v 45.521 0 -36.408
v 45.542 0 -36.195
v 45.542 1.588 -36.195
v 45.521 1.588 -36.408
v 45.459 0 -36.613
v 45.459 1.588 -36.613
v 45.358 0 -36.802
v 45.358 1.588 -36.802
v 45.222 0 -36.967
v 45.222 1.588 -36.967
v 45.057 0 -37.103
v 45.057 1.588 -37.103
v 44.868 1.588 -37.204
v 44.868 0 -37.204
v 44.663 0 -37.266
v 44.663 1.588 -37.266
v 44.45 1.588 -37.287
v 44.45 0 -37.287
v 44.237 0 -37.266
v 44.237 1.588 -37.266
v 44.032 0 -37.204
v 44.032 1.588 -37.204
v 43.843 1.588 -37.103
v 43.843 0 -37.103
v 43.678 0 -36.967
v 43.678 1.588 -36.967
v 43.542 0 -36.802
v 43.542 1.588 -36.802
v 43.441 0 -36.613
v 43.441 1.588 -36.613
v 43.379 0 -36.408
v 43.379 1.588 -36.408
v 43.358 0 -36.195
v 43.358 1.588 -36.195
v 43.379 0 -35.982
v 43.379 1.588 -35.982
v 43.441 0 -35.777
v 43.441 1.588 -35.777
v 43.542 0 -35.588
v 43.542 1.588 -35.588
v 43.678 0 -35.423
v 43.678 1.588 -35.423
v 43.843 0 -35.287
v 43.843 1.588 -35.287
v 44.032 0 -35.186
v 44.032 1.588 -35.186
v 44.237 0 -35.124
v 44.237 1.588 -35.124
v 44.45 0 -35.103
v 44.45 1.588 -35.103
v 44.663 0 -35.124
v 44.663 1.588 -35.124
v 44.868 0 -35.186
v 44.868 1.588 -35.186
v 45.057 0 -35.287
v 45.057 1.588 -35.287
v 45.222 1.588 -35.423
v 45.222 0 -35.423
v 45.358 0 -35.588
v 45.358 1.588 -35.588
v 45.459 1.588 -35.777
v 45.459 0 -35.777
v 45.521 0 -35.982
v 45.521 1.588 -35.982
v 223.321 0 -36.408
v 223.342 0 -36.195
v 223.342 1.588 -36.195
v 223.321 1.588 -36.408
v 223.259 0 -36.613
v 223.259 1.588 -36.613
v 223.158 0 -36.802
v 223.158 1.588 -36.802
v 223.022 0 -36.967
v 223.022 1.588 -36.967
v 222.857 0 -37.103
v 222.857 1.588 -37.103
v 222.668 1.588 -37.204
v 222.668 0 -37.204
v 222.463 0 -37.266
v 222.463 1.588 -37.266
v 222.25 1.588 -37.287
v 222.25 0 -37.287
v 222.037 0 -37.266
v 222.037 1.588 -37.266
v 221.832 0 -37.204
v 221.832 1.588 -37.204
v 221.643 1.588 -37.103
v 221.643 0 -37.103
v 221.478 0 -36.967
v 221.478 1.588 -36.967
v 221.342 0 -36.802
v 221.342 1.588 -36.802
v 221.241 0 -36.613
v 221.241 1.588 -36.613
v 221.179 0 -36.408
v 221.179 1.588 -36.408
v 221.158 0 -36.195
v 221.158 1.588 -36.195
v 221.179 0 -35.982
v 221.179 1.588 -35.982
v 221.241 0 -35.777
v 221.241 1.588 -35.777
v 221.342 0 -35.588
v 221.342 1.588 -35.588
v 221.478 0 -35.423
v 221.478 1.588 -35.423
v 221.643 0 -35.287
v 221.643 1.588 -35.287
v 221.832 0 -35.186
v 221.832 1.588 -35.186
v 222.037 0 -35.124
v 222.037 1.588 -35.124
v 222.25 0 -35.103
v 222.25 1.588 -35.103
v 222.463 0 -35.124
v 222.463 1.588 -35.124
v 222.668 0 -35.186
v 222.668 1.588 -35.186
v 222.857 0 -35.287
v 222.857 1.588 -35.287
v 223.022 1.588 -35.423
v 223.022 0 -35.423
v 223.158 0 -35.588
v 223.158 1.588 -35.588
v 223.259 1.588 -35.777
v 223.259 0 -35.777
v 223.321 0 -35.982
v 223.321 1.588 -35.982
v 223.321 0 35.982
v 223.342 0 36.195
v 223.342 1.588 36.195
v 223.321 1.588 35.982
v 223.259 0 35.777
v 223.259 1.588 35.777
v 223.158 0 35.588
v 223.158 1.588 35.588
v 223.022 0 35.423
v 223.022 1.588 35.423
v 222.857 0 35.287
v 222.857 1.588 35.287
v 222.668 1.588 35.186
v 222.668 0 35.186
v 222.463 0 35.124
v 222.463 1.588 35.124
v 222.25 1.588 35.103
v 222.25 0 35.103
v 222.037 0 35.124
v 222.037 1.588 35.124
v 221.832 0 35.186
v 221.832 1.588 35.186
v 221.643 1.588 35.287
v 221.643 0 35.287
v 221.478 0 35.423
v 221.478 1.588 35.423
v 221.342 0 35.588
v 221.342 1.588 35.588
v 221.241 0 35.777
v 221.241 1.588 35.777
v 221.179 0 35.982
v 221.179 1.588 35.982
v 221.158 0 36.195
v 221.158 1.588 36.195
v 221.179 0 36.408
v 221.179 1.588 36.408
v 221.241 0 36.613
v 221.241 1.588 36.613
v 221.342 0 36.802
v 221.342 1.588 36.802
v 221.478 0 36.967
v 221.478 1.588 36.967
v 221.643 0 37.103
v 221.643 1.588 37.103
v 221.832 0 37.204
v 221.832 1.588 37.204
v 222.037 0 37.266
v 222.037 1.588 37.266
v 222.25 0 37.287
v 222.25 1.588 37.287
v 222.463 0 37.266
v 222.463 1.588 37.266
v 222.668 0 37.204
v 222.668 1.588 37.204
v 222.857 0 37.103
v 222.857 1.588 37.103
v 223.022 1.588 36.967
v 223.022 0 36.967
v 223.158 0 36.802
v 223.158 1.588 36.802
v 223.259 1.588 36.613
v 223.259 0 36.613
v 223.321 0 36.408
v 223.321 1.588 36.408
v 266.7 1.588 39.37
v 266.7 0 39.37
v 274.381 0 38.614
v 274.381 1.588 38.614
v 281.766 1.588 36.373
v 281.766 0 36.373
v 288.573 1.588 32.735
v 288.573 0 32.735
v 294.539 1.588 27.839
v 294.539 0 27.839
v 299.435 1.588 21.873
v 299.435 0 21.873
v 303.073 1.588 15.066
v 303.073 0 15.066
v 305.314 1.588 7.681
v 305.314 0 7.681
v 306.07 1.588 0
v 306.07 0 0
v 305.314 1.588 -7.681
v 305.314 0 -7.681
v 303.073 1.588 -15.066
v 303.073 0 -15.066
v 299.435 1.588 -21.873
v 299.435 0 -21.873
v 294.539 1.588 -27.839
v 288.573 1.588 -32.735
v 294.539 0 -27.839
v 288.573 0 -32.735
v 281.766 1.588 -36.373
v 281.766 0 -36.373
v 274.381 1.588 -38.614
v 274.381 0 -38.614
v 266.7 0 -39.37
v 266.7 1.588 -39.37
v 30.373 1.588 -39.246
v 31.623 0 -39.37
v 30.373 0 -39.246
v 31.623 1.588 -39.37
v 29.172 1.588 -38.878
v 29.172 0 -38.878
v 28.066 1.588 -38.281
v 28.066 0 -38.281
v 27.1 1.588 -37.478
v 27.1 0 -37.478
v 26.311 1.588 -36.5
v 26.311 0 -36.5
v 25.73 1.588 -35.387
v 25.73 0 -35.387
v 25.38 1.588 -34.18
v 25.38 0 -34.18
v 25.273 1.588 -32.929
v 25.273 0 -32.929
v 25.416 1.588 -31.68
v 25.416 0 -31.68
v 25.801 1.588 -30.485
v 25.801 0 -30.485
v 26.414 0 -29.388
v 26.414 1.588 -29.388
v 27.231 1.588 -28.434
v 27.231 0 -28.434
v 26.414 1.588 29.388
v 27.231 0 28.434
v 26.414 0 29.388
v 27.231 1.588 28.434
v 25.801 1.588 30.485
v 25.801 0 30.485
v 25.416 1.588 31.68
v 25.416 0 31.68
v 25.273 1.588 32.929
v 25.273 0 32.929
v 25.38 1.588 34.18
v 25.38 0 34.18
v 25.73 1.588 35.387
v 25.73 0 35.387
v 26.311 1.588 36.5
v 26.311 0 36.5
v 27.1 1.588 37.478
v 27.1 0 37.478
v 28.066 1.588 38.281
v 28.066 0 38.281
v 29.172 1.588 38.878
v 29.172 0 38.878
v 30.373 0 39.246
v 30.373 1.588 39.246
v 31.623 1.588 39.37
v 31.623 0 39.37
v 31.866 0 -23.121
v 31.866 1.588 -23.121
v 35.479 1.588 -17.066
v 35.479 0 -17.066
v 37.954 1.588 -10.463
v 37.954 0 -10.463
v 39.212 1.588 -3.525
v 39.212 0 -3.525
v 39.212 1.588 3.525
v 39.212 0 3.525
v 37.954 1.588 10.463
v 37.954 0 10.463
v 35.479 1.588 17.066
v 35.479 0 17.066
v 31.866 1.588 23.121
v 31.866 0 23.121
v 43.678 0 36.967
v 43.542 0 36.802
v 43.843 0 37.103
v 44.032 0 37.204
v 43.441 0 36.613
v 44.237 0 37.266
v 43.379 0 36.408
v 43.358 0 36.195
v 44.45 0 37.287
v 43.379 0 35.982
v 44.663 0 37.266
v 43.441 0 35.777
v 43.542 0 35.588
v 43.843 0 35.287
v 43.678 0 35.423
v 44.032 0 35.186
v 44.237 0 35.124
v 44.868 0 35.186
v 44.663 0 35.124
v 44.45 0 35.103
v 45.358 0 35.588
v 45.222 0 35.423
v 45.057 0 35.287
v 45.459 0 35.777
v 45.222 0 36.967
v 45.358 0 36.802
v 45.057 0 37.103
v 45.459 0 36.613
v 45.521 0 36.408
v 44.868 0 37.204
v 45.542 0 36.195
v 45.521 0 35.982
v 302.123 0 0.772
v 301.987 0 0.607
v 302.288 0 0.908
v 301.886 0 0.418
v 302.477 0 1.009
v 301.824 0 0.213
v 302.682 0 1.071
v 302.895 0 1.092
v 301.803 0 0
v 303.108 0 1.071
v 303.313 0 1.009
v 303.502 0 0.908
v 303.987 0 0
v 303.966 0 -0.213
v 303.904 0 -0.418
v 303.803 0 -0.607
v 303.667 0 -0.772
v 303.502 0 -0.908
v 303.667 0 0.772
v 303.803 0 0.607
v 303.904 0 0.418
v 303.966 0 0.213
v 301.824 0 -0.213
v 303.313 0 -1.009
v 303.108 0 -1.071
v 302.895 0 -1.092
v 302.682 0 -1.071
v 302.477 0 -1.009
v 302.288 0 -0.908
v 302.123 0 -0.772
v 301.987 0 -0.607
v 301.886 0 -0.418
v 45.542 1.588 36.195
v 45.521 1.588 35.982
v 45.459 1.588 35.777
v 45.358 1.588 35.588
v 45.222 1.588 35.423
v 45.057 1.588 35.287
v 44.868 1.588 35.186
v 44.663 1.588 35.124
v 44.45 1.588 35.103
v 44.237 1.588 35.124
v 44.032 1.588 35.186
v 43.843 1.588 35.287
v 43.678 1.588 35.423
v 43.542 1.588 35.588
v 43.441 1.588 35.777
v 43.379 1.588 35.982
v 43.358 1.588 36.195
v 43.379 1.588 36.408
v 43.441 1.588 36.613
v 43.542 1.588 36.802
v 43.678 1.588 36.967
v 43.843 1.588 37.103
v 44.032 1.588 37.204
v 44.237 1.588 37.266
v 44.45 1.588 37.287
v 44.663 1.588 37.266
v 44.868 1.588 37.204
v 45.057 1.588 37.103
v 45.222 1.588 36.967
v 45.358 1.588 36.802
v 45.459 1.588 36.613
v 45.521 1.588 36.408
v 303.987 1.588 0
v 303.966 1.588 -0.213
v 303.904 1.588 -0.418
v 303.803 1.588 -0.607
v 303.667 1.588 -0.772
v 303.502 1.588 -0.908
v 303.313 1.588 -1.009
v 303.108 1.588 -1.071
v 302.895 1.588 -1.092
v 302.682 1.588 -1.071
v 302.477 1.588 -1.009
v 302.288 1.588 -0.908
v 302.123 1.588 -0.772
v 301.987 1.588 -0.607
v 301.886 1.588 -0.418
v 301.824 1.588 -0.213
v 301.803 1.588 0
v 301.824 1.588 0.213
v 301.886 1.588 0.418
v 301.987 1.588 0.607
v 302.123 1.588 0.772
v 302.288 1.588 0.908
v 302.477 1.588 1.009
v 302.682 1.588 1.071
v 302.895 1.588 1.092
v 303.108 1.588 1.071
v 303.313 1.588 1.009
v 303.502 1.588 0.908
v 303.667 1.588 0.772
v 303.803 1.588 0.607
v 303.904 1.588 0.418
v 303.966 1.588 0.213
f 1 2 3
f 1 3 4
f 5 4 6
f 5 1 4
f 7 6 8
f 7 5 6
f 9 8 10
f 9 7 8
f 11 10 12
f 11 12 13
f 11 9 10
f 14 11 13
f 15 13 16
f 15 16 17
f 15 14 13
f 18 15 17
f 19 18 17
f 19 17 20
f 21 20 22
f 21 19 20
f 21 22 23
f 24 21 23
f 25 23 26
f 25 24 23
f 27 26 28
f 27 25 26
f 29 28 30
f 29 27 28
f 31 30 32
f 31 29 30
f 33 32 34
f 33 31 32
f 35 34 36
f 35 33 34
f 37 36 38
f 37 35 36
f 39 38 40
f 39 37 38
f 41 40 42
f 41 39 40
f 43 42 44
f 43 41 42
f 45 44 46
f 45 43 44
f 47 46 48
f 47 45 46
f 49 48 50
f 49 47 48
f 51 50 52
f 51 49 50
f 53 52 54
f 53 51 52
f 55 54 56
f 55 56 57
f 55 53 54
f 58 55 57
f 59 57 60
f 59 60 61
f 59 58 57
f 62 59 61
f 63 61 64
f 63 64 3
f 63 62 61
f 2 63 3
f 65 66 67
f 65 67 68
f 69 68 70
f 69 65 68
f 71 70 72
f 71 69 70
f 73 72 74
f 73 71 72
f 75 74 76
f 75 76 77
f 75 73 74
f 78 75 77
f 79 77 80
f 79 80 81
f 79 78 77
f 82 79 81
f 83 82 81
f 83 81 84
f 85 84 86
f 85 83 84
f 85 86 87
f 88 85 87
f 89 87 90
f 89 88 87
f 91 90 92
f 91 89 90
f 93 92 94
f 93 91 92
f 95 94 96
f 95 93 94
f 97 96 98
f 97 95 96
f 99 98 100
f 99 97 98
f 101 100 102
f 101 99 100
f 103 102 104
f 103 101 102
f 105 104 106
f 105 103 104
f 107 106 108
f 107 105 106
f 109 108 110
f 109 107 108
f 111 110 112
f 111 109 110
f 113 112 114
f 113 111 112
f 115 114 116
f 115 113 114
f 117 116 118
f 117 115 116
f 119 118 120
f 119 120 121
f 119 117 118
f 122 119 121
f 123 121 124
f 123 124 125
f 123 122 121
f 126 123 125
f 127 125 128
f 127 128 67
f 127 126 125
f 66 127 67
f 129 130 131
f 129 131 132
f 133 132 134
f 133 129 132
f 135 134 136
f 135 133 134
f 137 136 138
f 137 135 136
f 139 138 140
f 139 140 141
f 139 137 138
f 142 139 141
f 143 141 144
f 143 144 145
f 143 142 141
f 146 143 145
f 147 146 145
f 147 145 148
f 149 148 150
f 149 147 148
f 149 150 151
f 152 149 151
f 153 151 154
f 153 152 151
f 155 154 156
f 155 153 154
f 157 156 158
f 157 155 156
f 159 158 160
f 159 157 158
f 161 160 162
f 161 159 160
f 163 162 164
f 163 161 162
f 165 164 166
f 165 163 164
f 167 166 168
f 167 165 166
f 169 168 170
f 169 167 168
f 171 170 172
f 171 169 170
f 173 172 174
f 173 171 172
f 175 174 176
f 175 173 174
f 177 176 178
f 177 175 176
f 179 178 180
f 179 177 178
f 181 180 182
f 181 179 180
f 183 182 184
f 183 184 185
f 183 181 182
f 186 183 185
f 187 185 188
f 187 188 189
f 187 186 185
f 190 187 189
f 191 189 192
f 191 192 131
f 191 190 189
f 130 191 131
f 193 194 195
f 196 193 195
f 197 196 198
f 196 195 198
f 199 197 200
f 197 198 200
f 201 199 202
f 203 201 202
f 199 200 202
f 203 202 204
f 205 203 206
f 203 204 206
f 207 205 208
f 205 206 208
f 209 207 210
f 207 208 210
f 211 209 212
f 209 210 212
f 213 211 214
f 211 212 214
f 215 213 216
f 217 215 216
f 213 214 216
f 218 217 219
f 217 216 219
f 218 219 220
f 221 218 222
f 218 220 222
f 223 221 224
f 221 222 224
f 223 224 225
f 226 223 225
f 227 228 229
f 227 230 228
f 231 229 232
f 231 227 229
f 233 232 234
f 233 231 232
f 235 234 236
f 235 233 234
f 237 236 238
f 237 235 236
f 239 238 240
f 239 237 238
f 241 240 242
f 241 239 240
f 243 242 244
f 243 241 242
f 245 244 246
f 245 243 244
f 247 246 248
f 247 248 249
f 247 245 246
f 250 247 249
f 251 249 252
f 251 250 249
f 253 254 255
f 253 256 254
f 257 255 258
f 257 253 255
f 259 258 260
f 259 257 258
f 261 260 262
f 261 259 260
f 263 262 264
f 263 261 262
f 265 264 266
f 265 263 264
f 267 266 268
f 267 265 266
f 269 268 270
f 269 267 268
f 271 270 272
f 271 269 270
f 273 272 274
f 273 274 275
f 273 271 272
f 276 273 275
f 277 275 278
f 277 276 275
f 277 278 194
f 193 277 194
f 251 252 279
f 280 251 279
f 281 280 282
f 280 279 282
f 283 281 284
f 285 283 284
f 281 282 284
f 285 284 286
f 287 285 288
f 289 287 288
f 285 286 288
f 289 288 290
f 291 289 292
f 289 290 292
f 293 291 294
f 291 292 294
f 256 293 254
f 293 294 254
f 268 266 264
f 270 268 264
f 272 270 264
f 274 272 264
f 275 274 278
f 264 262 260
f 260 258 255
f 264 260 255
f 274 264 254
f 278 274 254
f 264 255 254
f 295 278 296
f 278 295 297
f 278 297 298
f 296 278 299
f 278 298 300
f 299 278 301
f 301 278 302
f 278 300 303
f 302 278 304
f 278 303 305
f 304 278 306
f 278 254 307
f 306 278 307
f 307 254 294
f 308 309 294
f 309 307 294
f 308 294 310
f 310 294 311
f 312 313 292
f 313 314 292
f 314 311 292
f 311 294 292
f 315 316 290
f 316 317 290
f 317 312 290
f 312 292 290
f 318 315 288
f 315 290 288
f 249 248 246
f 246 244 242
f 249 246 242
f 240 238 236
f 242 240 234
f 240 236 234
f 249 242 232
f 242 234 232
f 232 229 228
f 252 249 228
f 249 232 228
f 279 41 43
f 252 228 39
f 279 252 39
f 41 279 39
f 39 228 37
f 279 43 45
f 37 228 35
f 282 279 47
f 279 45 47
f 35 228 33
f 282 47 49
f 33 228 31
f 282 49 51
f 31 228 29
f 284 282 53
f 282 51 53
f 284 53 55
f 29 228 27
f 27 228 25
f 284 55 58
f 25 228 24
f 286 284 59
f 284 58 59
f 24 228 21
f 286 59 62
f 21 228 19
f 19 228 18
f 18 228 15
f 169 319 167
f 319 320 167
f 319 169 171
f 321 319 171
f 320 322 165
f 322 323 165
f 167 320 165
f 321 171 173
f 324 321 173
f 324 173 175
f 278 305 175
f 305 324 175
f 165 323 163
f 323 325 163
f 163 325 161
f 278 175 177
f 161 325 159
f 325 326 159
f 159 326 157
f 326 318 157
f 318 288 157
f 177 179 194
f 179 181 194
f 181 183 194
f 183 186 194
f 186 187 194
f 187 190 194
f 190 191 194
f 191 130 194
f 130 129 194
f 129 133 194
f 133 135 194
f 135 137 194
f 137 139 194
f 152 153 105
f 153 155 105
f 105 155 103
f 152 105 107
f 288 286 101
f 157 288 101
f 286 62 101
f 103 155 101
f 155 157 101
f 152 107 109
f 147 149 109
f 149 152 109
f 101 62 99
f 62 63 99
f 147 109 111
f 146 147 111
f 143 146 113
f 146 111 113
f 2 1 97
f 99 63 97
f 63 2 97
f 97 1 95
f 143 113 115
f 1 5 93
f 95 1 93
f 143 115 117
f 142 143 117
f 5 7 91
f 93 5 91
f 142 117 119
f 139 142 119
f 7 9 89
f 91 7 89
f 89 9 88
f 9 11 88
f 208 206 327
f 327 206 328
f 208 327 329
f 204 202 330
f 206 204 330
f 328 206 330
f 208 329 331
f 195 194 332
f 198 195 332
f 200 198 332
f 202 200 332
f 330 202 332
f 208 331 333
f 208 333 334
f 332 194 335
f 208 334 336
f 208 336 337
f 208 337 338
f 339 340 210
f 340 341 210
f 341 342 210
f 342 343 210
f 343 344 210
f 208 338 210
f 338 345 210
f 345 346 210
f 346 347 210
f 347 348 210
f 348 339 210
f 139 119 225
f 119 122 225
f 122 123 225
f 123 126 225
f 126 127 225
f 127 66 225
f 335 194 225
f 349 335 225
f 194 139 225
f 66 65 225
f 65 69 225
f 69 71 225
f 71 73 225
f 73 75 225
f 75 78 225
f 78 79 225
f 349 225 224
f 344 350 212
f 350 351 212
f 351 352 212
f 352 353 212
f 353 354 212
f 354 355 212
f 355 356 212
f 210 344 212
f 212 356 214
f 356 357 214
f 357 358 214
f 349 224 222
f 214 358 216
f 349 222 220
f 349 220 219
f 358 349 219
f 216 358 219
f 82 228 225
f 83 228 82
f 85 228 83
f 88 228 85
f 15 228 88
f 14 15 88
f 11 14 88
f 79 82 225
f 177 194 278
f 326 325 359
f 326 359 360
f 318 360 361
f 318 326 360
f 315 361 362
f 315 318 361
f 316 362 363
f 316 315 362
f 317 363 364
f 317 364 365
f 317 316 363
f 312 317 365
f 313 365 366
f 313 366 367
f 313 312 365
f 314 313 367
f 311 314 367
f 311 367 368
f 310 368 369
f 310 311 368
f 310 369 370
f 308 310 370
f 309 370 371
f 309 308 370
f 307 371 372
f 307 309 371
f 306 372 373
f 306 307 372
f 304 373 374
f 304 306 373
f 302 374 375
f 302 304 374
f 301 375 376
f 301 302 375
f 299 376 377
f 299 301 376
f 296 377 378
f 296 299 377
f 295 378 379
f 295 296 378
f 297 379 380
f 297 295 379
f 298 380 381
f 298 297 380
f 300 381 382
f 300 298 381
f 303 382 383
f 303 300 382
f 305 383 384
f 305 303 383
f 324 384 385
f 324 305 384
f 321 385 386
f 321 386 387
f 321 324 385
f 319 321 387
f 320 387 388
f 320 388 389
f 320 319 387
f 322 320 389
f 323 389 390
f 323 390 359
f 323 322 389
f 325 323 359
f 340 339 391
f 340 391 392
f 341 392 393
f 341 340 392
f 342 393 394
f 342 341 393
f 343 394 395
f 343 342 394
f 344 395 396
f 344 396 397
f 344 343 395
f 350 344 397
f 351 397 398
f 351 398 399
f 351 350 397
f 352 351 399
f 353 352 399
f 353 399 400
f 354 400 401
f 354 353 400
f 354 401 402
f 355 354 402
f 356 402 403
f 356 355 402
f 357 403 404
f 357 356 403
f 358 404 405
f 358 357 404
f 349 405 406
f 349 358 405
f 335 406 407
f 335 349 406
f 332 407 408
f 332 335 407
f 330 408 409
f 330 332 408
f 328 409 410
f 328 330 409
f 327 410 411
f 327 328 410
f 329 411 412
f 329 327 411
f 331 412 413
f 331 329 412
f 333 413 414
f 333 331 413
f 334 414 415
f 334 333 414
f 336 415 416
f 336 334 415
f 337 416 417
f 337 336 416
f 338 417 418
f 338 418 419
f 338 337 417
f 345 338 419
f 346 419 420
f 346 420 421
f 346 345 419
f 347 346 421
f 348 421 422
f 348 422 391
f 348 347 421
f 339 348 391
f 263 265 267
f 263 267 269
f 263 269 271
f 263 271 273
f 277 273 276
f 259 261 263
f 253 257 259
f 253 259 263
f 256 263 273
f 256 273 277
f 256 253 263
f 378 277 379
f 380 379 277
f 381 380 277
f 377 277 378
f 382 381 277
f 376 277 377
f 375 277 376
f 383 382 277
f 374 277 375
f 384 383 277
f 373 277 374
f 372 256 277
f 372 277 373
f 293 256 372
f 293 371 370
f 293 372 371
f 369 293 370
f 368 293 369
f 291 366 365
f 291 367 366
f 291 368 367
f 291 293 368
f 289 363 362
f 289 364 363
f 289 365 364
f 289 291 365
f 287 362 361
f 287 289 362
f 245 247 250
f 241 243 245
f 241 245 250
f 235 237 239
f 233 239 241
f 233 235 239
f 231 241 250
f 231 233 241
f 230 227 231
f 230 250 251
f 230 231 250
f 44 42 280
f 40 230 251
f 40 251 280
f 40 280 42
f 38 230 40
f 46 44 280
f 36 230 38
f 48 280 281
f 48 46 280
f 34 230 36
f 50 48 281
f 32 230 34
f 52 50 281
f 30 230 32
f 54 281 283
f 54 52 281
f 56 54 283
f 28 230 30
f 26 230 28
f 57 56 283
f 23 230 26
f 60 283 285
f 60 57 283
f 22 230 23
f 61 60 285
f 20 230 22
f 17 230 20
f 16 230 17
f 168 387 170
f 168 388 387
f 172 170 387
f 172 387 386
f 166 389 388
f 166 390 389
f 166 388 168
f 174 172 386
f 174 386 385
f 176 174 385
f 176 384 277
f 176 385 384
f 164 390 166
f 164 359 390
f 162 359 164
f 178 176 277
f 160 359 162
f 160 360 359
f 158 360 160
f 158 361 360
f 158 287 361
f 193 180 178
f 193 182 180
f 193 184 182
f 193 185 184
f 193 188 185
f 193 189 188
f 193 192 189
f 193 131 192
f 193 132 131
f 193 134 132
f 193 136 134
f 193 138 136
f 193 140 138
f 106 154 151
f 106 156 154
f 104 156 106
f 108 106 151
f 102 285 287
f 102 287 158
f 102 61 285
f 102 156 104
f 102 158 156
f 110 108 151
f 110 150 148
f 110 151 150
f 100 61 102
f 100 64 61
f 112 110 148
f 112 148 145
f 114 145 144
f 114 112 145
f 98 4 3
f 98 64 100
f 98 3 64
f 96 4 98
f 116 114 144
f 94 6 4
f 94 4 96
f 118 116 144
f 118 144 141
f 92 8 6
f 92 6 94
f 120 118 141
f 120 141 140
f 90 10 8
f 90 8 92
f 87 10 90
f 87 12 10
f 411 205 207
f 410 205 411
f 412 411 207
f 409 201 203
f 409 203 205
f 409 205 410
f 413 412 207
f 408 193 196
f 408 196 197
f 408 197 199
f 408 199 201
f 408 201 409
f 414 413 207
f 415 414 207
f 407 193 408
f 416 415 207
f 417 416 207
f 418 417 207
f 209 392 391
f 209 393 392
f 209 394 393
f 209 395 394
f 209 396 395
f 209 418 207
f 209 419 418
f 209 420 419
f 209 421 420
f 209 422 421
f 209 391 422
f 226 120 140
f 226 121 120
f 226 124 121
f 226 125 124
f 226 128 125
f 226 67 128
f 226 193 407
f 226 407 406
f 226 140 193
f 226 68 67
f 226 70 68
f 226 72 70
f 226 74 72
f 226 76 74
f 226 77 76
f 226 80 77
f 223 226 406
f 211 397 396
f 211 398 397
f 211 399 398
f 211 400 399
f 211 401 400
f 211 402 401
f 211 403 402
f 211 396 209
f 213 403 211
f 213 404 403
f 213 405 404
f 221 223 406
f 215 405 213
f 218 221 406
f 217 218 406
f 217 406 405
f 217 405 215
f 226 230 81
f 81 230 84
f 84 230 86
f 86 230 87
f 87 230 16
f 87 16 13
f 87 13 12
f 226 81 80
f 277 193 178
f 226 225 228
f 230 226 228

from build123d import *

# Parameters (mm, degrees)
SKETCH1_R           = 1.0922
BOSS_EXTRUDE1_DEPTH = 1.5875
FILLET1_R           = 6.35


with BuildPart() as part:
    # Sketch1 → Boss-Extrude1 (new body)
    with BuildSketch(Plane(origin=(0, 0, 0), x_dir=(1, 0, 0), z_dir=(0, 1, 0))):
        with BuildLine():
            Line((266.7, 39.37), (0, 39.37))
            ThreePointArc((0, 39.37), (39.37, 0), (0, -39.37))
            Line((0, -39.37), (266.7, -39.37))
            ThreePointArc((266.7, -39.37), (306.07, 0), (266.7, 39.37))
        make_face()
        with Locations((302.895, 0)):
            Circle(SKETCH1_R, mode=Mode.SUBTRACT)
        with Locations((222.25, 36.195)):
            Circle(SKETCH1_R, mode=Mode.SUBTRACT)
        with Locations((44.45, 36.195)):
            Circle(SKETCH1_R, mode=Mode.SUBTRACT)
        with Locations((44.45, -36.195)):
            Circle(SKETCH1_R, mode=Mode.SUBTRACT)
        with Locations((222.25, -36.195)):
            Circle(SKETCH1_R, mode=Mode.SUBTRACT)
    extrude(amount=BOSS_EXTRUDE1_DEPTH)

    # Fillet1
    fillet1_edges = [part.edges().sort_by_distance(p)[0] for p in [
        (0, 0.79375, 39.37),
        (0, 0.79375, -39.37),
    ]]
    fillet(fillet1_edges, radius=FILLET1_R)


solid = part.part
